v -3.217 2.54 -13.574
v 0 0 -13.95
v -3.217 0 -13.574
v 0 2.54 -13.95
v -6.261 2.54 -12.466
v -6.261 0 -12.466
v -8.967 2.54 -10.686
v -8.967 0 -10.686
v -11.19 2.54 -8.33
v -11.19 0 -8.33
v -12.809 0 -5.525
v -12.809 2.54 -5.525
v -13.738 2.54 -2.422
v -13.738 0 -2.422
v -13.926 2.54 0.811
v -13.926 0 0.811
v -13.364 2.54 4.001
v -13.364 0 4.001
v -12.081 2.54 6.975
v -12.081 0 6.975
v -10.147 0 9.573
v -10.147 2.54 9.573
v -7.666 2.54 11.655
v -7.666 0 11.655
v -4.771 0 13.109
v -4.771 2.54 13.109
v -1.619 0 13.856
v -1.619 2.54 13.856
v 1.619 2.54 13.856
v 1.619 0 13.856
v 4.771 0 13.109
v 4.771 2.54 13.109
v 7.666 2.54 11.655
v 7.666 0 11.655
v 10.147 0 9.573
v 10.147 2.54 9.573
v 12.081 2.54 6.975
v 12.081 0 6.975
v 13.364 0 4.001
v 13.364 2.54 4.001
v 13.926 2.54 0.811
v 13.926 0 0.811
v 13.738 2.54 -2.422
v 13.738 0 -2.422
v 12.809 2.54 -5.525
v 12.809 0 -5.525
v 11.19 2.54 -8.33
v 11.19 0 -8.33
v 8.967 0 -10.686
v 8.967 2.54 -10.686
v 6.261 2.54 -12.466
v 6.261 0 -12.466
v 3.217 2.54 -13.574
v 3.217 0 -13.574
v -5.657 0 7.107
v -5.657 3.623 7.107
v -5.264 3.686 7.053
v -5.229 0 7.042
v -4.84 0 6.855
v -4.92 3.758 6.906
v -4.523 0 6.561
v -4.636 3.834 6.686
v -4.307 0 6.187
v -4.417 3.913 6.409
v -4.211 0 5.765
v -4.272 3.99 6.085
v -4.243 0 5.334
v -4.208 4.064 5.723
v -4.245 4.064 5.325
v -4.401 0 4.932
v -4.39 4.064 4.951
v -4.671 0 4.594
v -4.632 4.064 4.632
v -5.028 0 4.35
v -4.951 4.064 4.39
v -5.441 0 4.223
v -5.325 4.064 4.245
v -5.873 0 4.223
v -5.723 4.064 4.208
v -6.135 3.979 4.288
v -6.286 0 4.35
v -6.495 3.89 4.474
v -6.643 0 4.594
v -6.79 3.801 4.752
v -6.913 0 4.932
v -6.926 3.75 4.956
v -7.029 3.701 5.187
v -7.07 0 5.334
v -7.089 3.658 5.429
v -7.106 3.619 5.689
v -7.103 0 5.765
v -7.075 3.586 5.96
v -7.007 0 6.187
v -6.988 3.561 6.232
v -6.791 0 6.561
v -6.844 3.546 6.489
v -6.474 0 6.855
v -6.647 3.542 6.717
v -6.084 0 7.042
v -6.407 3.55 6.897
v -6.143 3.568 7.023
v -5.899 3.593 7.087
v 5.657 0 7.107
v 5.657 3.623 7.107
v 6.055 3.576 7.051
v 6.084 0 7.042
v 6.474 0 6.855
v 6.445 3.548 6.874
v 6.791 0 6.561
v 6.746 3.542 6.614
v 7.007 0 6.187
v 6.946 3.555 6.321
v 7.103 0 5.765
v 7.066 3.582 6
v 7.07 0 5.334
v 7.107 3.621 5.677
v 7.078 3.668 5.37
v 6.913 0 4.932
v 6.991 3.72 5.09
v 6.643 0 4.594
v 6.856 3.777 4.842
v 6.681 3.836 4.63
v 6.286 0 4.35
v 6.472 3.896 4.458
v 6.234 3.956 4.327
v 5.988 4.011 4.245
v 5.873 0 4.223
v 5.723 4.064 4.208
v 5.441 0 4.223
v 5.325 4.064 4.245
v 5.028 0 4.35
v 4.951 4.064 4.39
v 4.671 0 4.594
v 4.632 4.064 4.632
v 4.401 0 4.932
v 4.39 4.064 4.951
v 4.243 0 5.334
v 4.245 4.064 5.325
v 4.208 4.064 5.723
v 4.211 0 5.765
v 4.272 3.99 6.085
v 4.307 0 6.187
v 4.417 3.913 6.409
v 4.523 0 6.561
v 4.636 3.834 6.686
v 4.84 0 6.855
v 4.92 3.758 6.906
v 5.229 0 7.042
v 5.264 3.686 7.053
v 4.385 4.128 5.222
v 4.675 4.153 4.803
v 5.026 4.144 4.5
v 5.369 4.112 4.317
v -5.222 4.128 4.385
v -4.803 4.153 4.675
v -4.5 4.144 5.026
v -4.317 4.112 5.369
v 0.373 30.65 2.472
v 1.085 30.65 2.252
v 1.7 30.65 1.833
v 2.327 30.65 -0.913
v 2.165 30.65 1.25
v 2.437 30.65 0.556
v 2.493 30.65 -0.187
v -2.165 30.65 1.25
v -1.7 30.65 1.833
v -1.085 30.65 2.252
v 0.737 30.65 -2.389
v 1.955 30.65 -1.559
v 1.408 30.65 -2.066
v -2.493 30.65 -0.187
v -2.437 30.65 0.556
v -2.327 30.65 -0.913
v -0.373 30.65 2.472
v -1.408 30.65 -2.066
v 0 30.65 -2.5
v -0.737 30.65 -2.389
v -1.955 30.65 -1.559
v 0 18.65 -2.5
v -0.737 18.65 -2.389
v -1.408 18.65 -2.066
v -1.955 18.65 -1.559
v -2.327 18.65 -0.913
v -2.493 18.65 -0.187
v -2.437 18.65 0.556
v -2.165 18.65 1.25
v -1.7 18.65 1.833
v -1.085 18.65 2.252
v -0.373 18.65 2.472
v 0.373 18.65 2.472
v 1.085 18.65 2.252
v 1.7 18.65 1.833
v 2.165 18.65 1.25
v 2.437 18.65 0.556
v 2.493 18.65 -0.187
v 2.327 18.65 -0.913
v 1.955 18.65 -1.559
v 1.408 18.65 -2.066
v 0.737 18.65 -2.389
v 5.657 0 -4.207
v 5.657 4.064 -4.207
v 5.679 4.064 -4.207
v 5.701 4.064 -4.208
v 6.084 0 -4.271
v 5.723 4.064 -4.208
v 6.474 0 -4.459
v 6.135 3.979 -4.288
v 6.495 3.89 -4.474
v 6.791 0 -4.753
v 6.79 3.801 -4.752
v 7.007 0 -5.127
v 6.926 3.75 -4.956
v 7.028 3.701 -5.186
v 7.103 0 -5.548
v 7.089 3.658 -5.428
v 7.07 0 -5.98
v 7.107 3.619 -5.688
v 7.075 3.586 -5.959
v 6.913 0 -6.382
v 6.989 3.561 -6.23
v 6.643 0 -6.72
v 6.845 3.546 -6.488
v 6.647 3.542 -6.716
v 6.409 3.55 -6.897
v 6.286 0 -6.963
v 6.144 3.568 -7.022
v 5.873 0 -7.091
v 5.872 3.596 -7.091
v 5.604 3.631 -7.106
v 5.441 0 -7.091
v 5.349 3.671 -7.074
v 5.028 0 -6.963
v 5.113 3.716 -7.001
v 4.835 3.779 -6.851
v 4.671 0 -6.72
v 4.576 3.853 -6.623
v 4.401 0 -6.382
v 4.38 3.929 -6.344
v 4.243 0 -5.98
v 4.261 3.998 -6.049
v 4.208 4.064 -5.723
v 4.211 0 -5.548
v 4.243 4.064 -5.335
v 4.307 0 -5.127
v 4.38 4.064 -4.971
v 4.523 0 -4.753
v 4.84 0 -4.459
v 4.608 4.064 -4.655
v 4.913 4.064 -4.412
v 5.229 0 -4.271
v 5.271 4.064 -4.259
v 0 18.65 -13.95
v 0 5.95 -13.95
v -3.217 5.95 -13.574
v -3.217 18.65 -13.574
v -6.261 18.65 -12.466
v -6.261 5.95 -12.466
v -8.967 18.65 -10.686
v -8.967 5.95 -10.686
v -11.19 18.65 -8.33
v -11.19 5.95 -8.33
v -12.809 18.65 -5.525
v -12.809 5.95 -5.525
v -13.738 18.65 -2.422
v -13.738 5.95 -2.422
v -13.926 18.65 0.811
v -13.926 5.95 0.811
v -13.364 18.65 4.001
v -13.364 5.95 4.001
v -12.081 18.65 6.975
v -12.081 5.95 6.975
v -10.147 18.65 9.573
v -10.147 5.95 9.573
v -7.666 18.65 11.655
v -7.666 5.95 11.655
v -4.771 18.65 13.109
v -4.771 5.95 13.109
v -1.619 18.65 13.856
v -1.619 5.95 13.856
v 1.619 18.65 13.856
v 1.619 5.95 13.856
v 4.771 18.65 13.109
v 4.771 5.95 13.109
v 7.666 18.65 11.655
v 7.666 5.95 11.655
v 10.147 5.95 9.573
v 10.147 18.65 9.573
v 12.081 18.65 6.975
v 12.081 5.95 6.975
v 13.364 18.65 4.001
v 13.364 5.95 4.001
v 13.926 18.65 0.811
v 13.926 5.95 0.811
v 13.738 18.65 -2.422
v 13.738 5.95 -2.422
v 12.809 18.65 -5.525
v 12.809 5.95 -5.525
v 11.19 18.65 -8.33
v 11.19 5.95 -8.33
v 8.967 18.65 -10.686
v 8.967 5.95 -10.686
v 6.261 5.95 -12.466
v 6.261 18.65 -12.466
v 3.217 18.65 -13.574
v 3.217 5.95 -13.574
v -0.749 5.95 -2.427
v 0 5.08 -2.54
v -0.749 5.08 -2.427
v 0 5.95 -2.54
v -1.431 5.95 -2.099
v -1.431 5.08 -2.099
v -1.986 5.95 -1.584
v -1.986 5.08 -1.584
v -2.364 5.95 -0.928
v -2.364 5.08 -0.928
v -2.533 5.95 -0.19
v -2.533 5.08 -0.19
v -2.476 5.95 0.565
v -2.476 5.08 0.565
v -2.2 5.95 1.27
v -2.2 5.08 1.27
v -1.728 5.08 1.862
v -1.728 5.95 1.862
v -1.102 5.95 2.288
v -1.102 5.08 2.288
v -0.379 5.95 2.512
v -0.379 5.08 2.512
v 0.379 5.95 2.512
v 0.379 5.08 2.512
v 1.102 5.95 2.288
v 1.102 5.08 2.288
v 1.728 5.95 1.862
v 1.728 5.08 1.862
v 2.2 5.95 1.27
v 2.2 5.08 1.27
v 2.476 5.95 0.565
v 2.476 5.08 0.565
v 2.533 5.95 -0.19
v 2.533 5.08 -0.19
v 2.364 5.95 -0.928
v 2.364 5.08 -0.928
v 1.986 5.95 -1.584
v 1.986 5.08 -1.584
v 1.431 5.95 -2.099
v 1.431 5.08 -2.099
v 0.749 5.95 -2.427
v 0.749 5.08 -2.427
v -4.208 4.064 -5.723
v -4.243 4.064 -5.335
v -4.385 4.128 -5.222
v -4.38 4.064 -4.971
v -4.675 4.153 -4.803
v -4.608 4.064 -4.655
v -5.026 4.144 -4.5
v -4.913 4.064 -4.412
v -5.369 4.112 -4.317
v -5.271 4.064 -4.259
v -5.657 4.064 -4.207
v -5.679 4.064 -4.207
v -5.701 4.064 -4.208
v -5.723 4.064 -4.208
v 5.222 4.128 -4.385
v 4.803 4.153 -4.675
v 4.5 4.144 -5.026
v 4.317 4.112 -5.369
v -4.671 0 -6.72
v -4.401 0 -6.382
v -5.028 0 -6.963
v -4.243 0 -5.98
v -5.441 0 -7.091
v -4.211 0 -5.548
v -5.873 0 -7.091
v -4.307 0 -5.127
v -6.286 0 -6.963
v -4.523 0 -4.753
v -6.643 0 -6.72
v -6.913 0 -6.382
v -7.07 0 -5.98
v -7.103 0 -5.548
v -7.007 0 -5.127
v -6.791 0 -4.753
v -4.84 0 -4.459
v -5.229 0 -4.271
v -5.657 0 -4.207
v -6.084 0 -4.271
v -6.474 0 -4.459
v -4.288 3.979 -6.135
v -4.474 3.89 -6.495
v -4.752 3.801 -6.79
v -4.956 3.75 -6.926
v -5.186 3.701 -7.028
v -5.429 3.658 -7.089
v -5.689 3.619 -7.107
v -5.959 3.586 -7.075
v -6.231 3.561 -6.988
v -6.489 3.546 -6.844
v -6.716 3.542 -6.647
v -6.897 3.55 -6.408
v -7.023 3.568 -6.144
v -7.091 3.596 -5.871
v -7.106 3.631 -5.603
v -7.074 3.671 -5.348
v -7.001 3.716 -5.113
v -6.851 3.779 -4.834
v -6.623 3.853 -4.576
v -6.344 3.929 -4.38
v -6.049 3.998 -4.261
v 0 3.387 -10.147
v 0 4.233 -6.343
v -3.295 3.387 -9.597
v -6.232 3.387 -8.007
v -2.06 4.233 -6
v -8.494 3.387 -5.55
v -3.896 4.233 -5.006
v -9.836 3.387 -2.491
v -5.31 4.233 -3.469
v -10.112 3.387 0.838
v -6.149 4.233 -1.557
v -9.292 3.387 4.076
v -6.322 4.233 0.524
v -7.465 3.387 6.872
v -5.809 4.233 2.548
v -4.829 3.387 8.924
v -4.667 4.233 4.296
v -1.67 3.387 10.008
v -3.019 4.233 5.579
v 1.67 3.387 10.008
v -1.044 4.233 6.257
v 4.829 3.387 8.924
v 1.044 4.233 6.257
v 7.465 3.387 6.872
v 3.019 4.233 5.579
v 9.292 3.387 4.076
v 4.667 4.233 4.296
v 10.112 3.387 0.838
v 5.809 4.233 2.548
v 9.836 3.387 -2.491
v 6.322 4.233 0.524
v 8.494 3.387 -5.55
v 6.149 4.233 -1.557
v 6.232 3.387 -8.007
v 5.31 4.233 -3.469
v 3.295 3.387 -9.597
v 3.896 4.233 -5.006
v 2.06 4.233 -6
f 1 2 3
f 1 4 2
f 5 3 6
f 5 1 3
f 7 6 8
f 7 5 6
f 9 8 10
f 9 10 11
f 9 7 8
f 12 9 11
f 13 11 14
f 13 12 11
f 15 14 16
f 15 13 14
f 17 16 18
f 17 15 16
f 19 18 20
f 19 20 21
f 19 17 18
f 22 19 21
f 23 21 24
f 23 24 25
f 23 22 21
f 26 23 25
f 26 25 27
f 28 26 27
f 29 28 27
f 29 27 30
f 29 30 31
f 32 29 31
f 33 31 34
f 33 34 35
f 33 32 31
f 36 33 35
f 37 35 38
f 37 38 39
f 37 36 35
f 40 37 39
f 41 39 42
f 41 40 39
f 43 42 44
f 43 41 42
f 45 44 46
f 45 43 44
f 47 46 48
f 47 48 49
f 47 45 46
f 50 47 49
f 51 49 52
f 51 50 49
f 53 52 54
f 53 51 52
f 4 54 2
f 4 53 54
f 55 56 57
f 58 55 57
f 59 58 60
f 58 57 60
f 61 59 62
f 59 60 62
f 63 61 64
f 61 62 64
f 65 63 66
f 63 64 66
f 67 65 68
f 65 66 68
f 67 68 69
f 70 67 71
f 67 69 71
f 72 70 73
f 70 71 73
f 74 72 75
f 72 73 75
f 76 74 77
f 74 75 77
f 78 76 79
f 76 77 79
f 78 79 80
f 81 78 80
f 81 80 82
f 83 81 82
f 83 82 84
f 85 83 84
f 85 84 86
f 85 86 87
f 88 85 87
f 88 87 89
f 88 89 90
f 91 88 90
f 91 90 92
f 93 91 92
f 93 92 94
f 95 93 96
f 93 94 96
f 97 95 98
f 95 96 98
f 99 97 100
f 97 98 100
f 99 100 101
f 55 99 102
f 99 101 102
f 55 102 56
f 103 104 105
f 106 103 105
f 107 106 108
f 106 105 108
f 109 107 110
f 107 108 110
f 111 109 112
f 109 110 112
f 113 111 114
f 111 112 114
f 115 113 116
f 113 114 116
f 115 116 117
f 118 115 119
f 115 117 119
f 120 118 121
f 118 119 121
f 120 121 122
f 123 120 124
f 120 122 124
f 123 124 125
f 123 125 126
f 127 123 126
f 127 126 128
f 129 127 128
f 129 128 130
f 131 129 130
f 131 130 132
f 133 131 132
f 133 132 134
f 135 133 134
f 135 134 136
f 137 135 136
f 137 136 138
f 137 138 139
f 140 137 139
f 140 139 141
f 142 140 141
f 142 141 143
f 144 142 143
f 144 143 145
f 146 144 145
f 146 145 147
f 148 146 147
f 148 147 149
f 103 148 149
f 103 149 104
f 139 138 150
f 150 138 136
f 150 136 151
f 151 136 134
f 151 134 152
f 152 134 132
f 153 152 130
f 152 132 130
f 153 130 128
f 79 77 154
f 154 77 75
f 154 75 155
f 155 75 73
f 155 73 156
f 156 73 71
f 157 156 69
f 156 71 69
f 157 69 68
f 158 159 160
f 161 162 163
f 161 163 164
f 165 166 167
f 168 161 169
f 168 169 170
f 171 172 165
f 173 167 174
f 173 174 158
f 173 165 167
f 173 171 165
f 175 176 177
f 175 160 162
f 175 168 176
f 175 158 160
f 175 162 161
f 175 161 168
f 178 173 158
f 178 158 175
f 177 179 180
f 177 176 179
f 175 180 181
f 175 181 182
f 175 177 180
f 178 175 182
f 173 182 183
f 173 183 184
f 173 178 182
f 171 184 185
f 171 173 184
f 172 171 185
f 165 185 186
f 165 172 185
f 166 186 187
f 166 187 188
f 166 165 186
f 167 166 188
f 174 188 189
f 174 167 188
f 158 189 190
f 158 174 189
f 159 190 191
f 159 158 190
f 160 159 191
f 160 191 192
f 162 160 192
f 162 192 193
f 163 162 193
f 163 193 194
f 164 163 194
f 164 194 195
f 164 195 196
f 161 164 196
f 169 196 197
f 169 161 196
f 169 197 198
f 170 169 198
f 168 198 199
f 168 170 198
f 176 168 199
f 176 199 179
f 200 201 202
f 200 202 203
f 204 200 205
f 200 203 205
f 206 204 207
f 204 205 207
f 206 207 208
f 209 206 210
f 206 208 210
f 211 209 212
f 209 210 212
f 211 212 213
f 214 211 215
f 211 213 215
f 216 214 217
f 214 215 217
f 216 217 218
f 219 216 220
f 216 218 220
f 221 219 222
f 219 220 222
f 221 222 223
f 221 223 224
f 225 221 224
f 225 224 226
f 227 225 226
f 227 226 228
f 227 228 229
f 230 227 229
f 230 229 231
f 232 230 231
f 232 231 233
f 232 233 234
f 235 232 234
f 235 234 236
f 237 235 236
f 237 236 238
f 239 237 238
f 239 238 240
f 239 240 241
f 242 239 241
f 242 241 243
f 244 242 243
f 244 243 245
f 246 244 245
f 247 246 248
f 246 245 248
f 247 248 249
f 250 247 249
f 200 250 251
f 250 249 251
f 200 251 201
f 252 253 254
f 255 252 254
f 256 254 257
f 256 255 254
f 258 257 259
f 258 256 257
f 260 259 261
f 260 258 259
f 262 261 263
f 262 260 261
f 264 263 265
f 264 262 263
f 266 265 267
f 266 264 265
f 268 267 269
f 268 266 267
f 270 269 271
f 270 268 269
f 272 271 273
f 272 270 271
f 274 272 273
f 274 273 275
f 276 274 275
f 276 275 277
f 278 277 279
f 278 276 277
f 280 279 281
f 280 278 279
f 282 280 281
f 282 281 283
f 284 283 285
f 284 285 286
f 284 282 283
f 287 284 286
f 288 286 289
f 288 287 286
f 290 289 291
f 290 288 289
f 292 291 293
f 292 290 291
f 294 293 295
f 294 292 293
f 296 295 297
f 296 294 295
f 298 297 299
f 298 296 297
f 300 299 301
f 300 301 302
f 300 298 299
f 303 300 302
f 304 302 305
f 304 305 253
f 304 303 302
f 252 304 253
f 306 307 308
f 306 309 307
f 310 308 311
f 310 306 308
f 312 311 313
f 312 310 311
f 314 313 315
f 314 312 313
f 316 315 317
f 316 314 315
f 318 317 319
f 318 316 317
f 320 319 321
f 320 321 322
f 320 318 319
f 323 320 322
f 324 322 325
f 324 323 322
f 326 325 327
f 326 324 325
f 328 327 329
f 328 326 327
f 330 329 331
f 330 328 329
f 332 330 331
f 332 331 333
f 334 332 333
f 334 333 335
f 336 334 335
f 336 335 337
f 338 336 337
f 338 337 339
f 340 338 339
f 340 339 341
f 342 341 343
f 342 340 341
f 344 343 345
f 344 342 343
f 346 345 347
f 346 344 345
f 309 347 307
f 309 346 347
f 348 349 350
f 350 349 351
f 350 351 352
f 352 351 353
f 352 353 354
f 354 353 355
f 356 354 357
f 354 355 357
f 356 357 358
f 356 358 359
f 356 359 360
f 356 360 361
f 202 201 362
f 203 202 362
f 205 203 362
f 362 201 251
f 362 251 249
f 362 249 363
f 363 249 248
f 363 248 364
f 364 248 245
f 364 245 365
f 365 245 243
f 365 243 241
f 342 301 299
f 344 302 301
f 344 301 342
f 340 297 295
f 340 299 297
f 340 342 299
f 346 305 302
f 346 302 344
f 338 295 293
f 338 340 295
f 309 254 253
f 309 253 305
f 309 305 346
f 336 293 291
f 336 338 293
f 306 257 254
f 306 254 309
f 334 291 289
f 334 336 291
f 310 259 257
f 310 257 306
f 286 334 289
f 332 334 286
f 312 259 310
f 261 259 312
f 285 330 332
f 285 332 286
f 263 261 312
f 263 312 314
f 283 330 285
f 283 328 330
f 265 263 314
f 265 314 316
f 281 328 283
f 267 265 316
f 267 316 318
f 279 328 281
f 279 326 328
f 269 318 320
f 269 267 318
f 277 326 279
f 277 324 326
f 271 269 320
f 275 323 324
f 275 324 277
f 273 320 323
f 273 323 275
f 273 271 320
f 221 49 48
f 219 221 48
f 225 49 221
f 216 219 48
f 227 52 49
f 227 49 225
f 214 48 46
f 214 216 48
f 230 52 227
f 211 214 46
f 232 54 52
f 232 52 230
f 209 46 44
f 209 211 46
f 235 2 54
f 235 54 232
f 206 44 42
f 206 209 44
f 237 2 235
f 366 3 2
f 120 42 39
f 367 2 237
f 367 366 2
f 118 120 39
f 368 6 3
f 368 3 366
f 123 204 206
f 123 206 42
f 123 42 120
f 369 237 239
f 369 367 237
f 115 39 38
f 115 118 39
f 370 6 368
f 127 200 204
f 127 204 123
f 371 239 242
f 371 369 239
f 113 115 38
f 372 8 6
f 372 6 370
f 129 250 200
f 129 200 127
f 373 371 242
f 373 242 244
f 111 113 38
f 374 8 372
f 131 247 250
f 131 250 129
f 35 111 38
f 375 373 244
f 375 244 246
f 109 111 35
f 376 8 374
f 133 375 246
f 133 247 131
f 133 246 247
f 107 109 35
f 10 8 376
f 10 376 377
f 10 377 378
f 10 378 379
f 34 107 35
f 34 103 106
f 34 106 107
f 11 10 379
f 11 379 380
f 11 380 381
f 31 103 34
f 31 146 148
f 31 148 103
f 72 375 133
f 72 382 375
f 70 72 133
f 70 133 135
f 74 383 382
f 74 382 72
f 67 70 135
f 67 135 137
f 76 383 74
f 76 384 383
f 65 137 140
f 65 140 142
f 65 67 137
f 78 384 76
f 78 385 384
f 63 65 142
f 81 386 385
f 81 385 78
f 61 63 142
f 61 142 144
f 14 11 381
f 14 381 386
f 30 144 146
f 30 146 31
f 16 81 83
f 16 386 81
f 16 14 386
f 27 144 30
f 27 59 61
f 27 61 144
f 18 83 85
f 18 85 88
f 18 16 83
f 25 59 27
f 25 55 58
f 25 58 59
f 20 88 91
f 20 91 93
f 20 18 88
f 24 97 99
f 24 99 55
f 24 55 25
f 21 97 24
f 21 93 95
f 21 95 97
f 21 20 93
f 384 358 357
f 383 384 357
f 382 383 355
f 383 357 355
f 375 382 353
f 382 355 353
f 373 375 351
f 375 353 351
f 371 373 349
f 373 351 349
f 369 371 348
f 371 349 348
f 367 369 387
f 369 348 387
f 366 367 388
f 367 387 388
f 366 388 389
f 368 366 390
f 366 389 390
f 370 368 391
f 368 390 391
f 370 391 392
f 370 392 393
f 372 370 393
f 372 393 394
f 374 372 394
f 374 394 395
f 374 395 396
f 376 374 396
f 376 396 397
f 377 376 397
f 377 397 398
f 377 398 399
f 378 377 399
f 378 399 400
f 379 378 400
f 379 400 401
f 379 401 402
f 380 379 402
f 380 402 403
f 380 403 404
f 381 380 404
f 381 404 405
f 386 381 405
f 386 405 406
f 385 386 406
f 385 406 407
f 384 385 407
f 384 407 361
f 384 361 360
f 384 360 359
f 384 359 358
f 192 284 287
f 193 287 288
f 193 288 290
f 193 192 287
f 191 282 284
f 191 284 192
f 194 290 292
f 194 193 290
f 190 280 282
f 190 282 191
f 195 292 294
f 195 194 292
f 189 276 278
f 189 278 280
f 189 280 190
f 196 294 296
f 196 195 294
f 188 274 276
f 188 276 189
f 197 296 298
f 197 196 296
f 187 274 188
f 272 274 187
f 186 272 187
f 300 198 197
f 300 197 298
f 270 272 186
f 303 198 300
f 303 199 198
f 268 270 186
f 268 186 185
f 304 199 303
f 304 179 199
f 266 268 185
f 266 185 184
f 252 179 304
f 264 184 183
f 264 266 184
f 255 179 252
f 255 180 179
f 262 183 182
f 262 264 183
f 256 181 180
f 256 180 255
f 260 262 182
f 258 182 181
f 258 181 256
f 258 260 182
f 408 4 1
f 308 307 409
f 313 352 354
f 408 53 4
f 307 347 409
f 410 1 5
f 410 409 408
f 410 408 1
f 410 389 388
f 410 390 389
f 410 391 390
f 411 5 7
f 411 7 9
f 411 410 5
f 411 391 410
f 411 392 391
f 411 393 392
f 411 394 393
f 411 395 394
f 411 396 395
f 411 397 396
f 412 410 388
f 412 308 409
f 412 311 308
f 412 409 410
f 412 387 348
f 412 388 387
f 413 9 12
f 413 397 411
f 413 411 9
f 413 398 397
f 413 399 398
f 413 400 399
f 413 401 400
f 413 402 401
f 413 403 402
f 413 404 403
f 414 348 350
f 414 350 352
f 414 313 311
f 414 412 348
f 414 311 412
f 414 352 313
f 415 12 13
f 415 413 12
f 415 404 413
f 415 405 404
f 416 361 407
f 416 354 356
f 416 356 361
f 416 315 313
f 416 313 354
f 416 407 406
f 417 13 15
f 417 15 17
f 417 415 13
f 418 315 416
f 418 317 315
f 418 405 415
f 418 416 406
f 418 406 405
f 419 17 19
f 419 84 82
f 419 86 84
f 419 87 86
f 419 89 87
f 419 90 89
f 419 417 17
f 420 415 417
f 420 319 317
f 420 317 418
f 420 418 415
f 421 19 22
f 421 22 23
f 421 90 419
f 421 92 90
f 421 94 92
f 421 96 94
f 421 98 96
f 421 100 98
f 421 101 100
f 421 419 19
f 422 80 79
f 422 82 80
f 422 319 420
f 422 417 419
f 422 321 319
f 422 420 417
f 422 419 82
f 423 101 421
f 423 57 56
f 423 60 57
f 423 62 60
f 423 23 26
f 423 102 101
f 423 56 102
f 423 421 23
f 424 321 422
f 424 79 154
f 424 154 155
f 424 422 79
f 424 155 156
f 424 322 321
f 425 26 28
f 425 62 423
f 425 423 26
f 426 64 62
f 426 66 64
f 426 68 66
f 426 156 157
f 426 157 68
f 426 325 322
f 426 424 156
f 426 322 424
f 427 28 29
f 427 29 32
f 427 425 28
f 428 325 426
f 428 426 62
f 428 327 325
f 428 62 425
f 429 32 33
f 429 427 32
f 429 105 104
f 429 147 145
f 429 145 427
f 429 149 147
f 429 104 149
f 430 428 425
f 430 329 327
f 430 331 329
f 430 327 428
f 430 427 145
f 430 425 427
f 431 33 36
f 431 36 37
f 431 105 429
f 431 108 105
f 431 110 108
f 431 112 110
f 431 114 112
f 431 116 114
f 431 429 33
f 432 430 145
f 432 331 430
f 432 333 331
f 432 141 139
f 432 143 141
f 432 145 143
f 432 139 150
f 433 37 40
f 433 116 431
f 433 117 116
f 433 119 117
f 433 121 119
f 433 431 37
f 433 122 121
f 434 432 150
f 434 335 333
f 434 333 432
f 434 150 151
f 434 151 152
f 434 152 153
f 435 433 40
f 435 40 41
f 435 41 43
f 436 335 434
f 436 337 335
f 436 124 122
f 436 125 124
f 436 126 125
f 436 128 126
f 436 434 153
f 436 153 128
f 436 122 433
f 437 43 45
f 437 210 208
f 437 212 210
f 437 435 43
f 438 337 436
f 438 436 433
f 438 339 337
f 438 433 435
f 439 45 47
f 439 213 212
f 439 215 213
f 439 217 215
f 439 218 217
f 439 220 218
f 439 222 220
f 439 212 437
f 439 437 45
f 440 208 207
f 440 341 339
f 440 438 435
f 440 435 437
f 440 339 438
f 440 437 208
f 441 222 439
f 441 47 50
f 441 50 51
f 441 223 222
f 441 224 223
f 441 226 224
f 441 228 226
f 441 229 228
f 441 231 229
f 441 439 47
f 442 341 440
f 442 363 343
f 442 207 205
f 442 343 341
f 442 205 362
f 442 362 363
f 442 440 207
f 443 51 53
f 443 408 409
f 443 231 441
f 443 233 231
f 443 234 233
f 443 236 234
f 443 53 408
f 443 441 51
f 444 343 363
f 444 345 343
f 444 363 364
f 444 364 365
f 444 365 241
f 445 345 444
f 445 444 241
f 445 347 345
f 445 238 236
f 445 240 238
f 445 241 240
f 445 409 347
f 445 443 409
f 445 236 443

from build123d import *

# Parameters (mm, degrees)
M3_5X0_6_TAPPED_HOLE1_D     = 2.9
M3_5X0_6_TAPPED_HOLE1_DEPTH = 4.064
M3_5X0_6_TAPPED_HOLE1_TIP   = 0.871247898


with BuildPart() as part:
    # Sketch1 → Revolve1 (revolve)
    with BuildSketch(Plane.XY, mode=Mode.PRIVATE) as revolve1_sk:
        Polygon((0, 30.65), (0, 0), (13.95, 0), (13.95, 2.54), (2.54, 5.08), (2.54, 5.95), (13.95, 5.95), (13.95, 18.65), (2.5, 18.65), (2.5, 30.65), align=None)
    revolve(revolve1_sk.sketch.rotate(Axis((0, 0, 0), (0, 1, 0)), 90), axis=Axis((0, 0, 0), (0, 1, 0)))

    # M3.5x0.6 Tapped Hole1
    with Locations(Plane(origin=(-5.656854249, 0, 5.656854249), x_dir=(0, 0, -1), z_dir=(0, -1, 0))):
        with Locations((0, 0), (0, 11.313708498), (11.313708498, 11.313708498), (11.313708498, 0)):
            Hole(M3_5X0_6_TAPPED_HOLE1_D / 2, depth=M3_5X0_6_TAPPED_HOLE1_DEPTH)
            with Locations((0, 0, -(M3_5X0_6_TAPPED_HOLE1_DEPTH + M3_5X0_6_TAPPED_HOLE1_TIP / 2))):  # 118° drill point
                Cone(0, M3_5X0_6_TAPPED_HOLE1_D / 2, M3_5X0_6_TAPPED_HOLE1_TIP, mode=Mode.SUBTRACT)


solid = part.part
